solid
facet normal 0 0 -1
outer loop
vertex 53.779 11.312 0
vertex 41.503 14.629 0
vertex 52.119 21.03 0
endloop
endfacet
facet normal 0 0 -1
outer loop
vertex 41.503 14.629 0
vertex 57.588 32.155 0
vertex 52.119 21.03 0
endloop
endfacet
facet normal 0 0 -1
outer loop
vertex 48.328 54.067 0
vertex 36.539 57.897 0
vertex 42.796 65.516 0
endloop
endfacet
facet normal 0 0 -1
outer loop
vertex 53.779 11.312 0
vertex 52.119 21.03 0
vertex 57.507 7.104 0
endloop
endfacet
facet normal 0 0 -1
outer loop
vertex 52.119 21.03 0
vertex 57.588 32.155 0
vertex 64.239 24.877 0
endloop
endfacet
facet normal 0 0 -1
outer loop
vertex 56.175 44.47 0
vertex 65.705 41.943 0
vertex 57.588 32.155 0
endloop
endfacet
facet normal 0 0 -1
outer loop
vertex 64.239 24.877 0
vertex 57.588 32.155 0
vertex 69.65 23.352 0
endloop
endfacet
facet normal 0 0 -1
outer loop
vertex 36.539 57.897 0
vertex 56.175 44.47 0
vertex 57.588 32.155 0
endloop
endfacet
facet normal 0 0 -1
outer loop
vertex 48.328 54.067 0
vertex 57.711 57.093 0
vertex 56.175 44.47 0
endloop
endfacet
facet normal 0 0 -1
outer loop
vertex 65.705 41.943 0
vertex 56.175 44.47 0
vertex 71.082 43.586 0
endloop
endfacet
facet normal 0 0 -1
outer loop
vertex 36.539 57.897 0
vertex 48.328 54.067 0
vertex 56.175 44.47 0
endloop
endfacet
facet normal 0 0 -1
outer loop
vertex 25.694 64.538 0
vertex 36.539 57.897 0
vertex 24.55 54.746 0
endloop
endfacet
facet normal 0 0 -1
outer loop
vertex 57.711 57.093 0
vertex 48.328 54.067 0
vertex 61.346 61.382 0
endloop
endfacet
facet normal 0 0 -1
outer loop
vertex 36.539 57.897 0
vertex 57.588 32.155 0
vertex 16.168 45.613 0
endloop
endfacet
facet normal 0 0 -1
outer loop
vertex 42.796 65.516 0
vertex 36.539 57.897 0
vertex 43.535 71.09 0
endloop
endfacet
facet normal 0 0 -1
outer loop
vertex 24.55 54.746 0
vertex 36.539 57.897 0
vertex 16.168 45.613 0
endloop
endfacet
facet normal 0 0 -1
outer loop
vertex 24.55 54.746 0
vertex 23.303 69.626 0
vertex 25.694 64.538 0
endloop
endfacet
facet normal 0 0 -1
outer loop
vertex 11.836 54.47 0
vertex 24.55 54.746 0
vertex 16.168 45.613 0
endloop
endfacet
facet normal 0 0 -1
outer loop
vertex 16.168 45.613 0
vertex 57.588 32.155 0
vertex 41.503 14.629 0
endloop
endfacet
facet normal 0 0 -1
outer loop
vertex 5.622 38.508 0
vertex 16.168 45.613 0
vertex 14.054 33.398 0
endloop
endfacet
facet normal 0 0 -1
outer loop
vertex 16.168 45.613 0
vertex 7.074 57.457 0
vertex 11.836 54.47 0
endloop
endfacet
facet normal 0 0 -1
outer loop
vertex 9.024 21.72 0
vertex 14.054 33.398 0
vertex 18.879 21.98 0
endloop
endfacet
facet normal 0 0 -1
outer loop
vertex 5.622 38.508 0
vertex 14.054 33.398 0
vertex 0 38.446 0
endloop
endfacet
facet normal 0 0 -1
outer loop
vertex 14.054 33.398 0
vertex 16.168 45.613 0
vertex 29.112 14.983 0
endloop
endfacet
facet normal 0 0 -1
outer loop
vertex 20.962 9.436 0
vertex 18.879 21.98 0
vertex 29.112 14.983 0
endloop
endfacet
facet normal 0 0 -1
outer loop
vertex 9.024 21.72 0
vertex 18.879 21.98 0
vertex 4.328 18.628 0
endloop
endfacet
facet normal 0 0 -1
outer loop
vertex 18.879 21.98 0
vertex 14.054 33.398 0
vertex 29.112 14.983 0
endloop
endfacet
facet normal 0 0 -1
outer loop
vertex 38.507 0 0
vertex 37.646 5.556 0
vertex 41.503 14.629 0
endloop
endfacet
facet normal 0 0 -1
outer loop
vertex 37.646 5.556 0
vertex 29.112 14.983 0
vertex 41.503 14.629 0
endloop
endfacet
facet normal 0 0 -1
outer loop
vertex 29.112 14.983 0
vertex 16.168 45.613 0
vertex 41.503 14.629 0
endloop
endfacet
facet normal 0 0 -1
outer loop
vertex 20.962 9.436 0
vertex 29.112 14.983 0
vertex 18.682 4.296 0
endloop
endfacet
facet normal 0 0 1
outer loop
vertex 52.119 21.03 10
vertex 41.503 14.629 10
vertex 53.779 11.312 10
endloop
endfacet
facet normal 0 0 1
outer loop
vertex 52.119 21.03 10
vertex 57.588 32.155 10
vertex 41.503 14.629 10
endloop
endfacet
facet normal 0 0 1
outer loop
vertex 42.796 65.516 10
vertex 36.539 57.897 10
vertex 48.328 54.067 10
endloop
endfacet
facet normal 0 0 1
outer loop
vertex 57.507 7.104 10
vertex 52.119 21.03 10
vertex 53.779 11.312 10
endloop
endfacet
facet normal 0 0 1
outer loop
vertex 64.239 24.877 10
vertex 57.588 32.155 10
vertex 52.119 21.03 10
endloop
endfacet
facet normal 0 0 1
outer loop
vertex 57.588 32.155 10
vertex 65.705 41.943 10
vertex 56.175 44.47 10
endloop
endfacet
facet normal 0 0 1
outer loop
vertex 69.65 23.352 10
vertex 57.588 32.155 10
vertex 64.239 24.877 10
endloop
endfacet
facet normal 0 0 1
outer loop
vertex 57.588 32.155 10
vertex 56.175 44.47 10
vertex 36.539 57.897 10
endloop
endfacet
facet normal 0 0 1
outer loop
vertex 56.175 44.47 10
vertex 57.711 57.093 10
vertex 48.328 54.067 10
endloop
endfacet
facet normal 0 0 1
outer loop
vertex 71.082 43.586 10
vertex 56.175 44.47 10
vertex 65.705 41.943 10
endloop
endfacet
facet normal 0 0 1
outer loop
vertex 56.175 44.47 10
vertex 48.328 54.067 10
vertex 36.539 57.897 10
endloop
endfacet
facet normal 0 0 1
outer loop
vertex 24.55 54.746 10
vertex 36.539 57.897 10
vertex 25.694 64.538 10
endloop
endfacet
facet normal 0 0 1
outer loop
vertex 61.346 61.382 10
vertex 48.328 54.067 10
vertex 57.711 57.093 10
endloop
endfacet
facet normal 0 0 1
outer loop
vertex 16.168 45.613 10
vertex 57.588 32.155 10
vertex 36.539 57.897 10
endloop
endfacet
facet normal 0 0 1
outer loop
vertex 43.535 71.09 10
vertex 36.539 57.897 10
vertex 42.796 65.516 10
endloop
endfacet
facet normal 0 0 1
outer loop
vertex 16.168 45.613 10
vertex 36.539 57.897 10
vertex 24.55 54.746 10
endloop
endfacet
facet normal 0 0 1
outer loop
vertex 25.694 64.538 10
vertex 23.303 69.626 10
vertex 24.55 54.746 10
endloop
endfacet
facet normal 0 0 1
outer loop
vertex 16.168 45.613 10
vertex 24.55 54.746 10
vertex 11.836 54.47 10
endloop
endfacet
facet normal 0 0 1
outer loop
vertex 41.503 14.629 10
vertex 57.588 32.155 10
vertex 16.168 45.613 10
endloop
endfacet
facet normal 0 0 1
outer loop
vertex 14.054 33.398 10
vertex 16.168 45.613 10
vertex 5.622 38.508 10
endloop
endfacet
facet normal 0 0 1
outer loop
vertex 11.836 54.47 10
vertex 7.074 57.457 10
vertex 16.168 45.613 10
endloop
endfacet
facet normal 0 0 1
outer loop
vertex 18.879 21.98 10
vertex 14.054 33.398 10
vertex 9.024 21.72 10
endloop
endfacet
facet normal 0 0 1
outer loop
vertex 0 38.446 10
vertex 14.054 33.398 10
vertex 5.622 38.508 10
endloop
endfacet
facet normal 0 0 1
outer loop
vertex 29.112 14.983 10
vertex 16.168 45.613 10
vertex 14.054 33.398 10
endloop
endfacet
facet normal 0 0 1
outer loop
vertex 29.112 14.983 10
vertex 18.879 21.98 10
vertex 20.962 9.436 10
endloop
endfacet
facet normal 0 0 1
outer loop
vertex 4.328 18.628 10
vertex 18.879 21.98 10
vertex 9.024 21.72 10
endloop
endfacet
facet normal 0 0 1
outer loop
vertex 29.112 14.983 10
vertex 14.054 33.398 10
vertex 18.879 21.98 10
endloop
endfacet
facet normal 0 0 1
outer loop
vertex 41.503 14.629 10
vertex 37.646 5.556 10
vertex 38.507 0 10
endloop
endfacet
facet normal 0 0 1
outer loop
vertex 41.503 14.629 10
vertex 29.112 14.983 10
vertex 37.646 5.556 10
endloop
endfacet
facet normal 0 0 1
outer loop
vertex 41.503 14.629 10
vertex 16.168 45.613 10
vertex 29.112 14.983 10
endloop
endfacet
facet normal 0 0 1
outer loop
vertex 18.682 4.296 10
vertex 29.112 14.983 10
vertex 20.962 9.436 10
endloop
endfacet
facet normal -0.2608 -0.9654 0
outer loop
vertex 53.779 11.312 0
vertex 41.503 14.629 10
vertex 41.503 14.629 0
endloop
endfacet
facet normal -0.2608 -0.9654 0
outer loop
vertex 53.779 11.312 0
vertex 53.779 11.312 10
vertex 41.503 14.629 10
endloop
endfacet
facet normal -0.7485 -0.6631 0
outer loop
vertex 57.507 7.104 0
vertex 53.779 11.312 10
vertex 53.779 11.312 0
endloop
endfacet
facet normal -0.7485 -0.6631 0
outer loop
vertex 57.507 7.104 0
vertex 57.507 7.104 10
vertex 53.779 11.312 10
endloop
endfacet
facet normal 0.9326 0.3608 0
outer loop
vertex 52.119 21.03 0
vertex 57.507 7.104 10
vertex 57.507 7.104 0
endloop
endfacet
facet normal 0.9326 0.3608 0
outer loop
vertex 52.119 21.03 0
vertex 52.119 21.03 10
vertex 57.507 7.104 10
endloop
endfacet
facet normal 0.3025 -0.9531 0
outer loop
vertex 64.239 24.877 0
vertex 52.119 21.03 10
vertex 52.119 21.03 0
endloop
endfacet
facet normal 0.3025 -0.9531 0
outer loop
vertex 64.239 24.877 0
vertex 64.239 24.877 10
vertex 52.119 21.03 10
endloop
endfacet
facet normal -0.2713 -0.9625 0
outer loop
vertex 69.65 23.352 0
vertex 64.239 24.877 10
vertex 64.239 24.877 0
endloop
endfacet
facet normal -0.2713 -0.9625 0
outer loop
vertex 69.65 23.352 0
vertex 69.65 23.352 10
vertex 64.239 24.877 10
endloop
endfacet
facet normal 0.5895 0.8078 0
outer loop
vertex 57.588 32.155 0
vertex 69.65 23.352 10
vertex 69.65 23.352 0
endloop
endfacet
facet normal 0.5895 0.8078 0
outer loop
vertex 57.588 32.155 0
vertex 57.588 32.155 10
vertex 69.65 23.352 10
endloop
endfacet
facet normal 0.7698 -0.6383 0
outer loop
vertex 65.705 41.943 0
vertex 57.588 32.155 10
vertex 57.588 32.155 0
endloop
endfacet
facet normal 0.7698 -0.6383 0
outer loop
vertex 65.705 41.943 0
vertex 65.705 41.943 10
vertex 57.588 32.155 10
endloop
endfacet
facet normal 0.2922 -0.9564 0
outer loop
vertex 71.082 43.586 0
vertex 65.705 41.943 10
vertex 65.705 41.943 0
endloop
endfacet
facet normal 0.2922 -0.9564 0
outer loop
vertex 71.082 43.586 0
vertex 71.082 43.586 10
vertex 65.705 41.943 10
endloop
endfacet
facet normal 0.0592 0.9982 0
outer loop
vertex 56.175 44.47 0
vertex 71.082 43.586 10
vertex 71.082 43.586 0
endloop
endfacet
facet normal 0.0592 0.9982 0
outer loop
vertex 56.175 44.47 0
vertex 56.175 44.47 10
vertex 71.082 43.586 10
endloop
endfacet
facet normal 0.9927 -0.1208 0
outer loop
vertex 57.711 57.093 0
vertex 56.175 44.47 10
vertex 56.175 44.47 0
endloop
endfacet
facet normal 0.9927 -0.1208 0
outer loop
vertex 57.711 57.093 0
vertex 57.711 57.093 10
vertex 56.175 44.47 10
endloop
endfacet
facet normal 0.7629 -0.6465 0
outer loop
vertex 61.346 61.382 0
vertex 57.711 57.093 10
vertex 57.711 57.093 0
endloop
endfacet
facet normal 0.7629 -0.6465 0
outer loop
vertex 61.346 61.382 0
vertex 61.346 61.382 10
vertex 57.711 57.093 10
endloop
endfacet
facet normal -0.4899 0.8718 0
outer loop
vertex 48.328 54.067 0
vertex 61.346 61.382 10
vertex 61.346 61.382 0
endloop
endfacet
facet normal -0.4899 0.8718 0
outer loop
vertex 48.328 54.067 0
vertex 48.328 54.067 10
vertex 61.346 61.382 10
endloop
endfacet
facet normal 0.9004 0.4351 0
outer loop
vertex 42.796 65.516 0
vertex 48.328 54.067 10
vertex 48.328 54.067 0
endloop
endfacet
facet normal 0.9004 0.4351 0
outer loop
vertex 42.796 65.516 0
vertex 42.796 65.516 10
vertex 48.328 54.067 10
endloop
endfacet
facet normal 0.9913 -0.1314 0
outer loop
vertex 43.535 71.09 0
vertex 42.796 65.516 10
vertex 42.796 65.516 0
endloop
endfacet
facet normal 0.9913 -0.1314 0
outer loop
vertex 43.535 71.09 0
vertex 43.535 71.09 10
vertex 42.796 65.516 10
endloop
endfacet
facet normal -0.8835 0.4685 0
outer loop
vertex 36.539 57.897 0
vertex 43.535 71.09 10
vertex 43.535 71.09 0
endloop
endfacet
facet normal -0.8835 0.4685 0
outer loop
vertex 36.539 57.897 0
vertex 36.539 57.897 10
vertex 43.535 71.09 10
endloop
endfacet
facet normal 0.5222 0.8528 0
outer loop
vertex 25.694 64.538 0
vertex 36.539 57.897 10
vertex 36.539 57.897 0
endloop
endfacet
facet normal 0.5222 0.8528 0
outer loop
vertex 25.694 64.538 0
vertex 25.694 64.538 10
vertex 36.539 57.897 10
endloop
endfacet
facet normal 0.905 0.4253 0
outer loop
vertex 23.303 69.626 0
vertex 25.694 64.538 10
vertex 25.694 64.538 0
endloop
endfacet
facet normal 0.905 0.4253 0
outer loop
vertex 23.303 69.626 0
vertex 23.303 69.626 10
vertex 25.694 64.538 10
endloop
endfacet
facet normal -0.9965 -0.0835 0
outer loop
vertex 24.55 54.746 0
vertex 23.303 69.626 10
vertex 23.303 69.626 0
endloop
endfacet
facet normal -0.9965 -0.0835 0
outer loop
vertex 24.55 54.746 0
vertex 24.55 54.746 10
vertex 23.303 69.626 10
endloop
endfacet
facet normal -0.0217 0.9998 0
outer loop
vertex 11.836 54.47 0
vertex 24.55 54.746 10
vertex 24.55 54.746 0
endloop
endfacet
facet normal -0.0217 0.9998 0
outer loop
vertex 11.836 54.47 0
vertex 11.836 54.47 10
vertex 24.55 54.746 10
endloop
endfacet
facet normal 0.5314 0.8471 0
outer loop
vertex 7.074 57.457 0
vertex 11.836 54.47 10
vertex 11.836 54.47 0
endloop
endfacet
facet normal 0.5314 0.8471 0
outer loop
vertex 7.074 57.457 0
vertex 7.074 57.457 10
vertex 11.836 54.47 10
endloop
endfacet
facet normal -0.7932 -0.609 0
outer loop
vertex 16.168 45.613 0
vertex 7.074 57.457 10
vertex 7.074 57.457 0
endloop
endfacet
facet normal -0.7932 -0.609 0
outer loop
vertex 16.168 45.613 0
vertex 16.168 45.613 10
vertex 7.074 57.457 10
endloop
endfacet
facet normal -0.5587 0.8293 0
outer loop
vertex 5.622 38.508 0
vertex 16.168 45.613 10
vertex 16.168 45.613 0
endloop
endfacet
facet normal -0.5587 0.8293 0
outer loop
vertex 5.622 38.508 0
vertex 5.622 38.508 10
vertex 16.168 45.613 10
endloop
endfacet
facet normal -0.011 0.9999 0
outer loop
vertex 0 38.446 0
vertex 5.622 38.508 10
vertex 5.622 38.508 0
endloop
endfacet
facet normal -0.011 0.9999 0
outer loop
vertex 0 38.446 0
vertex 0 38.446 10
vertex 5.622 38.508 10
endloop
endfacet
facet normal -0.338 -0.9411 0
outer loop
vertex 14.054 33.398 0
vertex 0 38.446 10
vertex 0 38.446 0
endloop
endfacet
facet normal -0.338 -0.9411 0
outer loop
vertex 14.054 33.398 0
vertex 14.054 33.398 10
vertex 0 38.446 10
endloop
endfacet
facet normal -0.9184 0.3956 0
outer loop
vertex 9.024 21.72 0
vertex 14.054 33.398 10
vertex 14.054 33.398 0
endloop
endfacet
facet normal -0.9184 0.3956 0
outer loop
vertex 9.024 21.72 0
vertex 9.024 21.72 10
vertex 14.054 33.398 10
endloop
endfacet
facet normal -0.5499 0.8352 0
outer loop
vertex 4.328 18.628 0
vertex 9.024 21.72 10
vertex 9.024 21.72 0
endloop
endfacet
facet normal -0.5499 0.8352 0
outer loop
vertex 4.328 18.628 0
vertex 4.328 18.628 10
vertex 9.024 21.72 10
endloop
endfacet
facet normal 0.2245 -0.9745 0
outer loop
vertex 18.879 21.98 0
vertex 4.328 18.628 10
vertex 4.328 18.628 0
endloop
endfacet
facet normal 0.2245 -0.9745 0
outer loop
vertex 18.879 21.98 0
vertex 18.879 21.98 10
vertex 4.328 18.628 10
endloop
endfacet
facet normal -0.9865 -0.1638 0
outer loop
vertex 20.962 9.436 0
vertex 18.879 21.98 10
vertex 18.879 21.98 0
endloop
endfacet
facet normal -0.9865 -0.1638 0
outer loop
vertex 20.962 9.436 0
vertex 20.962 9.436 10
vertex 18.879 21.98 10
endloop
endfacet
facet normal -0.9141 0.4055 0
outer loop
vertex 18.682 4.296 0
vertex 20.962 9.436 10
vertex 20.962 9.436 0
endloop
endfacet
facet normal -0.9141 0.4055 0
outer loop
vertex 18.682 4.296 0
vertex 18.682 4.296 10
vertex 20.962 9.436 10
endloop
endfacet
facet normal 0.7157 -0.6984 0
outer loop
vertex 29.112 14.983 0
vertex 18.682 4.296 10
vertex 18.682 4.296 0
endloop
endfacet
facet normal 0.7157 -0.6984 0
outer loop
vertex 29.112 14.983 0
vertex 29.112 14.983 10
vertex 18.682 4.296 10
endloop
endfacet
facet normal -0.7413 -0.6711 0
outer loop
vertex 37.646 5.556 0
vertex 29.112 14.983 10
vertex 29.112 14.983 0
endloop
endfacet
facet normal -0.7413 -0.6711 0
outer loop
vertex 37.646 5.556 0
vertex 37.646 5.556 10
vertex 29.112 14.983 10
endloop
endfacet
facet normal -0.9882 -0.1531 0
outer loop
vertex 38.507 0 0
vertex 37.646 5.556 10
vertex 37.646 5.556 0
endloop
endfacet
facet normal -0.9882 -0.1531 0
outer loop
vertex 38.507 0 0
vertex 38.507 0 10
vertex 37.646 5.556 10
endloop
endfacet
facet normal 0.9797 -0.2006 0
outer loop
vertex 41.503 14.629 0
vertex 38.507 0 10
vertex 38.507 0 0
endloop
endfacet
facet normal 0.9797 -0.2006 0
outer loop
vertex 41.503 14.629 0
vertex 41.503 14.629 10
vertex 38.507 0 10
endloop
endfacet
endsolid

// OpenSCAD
$fn = 32;

// ----------------------------------------------------------------------
// Fan rotor section: 11 blades, 22 mm hub radius, 14 mm blades
// ----------------------------------------------------------------------

// --- parameters (mm) ---
profile_height = 10;      // extrusion height
profile_points = 33;      // points of the closed outline

profile = [[57.588, 32.155], [65.705, 41.943], [71.082, 43.586], [56.175, 44.47], [57.711, 57.093], [61.346, 61.382], [48.328, 54.067], [42.796, 65.516], [43.535, 71.09], [36.539, 57.897], [25.694, 64.538], [23.303, 69.626], [24.55, 54.746], [11.836, 54.47], [7.074, 57.457], [16.168, 45.613], [5.622, 38.508], [0, 38.446], [14.054, 33.398], [9.024, 21.72], [4.328, 18.628], [18.879, 21.98], [20.962, 9.436], [18.682, 4.296], [29.112, 14.983], [37.646, 5.556], [38.507, 0], [41.503, 14.629], [53.779, 11.312], [57.507, 7.104], [52.119, 21.03], [64.239, 24.877], [69.65, 23.352]];  // single closed polygon, 33 points, counter clockwise

// --- the one profile operation ---
linear_extrude(height = profile_height) polygon(points = profile);
